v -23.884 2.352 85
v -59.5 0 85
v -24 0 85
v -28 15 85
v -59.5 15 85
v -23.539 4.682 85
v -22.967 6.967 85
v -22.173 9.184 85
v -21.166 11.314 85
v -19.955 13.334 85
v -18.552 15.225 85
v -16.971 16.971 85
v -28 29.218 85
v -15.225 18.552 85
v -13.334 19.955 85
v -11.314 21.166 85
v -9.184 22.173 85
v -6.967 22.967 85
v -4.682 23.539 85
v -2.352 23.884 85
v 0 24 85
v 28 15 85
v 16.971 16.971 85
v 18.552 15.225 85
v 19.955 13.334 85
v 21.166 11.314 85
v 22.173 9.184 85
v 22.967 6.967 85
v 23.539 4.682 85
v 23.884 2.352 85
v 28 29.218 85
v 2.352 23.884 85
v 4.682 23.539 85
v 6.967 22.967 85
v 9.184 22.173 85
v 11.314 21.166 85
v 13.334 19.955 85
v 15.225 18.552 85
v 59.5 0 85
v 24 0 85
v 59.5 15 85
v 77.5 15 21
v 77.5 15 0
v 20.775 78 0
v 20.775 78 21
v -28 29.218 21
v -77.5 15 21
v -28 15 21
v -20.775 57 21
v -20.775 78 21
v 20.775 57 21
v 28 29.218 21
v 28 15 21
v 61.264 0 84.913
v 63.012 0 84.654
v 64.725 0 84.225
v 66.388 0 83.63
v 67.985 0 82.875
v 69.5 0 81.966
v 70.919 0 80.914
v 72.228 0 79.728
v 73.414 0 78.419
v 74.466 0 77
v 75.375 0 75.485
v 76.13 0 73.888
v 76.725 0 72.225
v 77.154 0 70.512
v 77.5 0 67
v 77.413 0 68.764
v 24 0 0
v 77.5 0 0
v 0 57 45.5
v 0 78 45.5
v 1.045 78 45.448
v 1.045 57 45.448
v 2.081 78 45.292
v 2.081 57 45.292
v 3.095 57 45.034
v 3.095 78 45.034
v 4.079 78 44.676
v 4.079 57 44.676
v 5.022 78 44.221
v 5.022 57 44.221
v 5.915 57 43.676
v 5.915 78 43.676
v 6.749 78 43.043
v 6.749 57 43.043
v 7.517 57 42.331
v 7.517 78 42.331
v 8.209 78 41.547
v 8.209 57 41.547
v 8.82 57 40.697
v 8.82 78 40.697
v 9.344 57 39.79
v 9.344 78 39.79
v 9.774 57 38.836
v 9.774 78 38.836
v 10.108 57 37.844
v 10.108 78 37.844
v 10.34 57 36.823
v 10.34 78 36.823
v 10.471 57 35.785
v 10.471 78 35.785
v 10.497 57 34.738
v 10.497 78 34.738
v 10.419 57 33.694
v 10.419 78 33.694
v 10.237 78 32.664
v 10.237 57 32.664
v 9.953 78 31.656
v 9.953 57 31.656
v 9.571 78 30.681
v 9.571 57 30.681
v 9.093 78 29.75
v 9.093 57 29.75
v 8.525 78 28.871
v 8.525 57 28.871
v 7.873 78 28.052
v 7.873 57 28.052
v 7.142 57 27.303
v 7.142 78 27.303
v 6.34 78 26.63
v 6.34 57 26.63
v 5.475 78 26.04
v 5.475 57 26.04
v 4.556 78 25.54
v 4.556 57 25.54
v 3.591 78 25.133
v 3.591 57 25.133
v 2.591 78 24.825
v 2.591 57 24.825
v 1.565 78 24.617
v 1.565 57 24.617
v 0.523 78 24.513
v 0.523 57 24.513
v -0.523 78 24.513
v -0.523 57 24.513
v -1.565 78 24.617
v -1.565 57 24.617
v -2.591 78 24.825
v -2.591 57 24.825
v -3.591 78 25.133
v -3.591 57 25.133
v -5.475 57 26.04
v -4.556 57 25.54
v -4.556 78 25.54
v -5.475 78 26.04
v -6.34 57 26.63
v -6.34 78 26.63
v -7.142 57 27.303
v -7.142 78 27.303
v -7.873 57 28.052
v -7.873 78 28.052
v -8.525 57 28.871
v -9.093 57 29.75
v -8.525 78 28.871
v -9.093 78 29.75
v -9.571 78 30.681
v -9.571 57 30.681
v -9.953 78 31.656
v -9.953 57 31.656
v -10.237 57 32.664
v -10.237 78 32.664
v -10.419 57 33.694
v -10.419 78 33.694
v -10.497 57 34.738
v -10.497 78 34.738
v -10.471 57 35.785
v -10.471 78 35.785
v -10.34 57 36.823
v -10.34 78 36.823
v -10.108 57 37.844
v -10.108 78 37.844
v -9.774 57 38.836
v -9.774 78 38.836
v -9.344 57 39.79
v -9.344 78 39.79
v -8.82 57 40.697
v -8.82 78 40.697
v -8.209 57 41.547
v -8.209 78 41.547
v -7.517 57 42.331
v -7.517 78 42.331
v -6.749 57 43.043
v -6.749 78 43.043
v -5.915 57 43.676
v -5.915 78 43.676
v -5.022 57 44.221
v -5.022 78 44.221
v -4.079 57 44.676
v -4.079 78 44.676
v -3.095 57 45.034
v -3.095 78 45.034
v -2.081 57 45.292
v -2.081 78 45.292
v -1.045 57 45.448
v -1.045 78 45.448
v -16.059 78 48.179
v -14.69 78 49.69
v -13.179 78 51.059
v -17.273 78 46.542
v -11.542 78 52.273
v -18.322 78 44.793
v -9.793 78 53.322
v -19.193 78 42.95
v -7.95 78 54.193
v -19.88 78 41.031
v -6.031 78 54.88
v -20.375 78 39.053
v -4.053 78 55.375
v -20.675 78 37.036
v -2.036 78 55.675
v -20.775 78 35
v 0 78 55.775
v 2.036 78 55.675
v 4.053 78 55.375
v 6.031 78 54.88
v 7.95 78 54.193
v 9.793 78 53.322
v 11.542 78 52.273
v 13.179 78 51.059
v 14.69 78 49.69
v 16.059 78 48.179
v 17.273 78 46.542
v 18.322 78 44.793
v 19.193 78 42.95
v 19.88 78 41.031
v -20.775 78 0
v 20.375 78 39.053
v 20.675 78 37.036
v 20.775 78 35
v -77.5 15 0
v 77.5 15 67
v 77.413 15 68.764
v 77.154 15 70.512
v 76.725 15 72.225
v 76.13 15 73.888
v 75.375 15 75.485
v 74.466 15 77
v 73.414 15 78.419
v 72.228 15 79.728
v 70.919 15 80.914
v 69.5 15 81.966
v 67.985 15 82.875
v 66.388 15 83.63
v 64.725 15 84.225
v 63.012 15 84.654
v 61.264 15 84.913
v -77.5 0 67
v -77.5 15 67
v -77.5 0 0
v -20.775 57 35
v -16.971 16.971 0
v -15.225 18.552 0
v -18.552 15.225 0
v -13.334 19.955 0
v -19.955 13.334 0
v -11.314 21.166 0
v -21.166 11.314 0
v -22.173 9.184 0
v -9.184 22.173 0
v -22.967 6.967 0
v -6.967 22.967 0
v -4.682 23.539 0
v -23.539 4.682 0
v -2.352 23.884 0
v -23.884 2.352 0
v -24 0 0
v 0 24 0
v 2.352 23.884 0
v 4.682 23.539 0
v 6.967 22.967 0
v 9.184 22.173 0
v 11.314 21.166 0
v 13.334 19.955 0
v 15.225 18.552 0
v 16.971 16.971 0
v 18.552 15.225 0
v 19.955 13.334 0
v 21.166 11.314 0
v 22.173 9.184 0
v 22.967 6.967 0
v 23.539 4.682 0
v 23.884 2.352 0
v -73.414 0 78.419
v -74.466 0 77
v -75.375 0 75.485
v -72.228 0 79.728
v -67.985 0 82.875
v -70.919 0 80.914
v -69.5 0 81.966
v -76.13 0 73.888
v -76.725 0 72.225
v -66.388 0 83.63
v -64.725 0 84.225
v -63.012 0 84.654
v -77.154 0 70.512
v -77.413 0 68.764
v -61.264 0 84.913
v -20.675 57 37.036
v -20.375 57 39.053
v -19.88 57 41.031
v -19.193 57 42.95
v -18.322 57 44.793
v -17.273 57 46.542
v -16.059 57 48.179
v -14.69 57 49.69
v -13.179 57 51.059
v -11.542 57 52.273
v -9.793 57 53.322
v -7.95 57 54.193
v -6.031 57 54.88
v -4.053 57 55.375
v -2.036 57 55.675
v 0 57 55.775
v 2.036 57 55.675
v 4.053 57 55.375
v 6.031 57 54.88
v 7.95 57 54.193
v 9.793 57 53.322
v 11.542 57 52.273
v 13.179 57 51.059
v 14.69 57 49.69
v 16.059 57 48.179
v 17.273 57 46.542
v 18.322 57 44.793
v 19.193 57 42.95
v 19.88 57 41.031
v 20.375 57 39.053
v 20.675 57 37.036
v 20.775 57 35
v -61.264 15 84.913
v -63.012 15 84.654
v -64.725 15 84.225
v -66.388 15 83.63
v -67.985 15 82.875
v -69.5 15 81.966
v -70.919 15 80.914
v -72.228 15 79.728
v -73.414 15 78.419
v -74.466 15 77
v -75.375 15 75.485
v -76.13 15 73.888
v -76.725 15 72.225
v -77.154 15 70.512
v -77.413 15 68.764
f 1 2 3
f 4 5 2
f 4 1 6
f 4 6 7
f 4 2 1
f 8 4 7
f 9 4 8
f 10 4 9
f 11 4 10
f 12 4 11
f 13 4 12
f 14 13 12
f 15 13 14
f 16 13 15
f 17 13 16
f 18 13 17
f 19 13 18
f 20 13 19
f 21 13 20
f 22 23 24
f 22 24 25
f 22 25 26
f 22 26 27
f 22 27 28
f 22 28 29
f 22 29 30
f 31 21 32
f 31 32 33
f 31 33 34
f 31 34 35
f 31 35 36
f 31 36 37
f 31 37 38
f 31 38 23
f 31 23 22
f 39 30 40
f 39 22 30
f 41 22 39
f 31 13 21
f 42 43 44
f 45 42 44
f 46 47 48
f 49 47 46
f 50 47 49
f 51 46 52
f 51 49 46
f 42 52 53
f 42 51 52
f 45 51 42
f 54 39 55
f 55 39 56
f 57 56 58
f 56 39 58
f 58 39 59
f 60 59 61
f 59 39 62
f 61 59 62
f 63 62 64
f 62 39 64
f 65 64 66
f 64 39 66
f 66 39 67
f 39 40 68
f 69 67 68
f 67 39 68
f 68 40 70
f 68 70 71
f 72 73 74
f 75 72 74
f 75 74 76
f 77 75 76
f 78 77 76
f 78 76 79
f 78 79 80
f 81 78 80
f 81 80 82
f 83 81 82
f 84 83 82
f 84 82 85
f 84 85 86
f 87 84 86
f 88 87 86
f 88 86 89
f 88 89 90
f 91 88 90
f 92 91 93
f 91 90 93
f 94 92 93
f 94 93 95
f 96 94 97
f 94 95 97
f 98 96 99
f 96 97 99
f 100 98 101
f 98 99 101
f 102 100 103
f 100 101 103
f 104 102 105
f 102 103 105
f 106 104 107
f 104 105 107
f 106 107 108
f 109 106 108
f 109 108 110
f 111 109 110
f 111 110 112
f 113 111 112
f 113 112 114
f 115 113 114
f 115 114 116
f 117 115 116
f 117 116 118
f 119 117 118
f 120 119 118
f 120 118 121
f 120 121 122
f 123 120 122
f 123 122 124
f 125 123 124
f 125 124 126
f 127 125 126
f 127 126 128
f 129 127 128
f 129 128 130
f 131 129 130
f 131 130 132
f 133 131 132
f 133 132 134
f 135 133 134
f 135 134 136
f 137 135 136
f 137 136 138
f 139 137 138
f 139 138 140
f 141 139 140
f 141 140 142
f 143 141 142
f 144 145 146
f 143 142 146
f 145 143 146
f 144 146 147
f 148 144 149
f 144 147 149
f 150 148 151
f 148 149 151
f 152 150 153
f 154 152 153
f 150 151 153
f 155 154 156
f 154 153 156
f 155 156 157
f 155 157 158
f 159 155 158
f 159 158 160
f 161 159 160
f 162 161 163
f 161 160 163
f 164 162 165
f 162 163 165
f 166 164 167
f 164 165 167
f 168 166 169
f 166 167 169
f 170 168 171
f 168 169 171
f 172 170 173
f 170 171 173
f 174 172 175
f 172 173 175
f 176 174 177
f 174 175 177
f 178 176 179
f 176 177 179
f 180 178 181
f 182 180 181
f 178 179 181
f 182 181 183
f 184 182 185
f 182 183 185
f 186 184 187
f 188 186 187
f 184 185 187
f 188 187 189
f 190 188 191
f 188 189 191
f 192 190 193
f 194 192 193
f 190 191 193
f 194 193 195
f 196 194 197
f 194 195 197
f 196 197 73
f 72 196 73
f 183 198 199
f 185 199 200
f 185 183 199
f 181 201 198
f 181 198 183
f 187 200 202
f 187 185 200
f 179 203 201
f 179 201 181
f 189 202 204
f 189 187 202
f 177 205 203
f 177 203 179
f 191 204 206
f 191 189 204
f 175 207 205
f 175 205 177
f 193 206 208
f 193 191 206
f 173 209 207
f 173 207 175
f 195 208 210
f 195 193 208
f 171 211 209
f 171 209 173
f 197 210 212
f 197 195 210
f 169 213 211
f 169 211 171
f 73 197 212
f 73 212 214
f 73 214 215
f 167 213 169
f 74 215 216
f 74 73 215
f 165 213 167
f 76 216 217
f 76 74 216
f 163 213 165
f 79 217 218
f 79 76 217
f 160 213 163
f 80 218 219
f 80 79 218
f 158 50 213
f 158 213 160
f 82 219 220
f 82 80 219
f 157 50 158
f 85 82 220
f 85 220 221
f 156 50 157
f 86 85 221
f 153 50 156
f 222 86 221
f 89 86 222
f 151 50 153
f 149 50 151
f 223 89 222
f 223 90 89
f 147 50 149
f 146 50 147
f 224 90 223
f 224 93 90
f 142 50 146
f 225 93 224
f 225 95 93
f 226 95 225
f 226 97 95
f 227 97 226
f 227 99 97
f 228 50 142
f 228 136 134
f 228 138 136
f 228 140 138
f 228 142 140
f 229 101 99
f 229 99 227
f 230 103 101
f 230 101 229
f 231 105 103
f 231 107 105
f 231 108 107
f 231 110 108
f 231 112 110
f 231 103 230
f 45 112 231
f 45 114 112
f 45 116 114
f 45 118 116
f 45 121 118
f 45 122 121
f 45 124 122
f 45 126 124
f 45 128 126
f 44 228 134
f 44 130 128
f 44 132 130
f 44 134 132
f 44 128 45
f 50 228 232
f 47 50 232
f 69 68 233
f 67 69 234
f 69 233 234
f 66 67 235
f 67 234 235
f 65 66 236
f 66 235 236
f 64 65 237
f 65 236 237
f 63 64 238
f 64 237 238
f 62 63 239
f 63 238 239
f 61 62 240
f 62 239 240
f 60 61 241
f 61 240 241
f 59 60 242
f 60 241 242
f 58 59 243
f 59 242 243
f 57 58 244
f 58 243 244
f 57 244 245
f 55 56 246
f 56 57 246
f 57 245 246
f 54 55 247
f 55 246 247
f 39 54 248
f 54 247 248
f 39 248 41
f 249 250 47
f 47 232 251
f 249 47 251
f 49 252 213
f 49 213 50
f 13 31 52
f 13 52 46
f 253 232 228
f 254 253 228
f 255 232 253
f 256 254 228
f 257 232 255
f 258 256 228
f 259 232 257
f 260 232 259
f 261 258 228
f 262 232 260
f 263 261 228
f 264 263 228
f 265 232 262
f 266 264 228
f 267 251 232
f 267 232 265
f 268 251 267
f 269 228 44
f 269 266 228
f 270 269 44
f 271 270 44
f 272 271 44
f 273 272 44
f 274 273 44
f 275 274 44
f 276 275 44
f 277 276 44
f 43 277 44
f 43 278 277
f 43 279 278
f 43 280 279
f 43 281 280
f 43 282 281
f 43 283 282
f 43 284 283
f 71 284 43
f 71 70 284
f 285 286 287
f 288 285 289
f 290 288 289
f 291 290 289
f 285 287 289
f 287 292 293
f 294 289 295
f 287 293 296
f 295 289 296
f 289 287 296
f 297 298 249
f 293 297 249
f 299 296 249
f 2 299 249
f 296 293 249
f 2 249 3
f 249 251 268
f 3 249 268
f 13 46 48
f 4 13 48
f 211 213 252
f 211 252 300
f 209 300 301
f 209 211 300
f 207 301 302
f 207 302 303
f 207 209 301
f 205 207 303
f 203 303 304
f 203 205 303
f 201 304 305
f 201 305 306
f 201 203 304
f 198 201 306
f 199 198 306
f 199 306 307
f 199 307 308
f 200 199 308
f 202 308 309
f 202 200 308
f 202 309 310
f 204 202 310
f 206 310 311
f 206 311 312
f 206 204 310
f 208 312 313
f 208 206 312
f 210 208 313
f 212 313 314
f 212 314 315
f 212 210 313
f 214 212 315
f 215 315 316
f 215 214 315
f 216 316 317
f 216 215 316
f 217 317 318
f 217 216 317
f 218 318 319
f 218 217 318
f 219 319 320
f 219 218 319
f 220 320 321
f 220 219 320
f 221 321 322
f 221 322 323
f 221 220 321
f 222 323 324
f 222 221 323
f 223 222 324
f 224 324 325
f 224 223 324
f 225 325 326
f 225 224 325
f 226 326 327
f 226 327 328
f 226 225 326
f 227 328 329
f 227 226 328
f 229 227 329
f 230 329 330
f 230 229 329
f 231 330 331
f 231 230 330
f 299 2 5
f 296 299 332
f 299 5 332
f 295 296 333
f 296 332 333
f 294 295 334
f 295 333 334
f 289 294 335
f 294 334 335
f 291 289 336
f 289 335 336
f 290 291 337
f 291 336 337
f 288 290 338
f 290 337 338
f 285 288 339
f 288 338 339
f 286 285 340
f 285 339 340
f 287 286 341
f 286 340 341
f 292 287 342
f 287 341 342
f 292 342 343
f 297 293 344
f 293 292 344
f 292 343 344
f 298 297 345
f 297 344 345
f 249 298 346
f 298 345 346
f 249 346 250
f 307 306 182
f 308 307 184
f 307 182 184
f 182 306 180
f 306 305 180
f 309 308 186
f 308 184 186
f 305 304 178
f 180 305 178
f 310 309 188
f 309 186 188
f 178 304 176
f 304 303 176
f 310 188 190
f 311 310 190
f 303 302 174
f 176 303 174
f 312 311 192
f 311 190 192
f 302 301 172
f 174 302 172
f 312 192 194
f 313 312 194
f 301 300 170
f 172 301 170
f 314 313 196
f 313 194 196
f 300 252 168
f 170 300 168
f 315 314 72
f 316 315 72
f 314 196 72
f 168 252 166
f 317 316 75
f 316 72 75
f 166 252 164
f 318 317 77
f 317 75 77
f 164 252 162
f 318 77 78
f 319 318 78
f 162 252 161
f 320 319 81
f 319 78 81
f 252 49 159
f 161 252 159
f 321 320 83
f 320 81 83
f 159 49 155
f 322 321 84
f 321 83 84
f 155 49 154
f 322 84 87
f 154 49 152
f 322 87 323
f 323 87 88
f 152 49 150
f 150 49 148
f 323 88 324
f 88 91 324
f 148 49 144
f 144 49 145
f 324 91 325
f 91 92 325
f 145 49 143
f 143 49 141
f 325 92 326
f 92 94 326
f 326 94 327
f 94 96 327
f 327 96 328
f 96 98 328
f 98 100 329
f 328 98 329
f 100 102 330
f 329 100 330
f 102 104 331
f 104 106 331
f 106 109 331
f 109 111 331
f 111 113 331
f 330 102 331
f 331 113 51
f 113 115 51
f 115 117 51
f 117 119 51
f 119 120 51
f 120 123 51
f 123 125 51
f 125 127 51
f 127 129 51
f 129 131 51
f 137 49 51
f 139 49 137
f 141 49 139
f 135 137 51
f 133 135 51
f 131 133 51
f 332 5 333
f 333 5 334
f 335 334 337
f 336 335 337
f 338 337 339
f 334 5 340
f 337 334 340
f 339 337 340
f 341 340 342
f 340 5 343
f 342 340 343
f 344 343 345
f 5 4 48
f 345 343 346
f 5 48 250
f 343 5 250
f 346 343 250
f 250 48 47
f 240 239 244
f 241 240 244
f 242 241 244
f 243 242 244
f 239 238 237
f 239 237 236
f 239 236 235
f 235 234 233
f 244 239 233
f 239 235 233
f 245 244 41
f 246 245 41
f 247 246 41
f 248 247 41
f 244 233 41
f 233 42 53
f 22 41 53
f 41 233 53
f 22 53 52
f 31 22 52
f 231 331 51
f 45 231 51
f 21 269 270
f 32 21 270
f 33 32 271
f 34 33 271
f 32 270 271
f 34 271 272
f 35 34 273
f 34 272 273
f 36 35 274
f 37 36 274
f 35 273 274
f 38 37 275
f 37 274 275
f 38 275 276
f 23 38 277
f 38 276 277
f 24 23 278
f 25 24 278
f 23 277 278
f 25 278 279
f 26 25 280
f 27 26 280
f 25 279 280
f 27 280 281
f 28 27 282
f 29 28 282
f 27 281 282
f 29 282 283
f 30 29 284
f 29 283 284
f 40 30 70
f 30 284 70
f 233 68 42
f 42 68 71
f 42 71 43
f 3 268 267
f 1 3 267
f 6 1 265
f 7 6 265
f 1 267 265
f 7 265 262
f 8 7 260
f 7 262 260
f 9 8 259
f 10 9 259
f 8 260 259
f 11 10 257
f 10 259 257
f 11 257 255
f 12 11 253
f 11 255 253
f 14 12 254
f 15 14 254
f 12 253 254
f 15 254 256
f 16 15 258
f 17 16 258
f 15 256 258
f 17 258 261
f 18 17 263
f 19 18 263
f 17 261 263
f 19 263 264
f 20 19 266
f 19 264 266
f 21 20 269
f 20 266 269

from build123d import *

# Parameters (mm, degrees)
EXTRUDE_1_DEPTH     = 85
EXTRUDE_2_DEPTH     = 21
CUT_EXTRUDE_1_DEPTH = 21
CUT_EXTRUDE_2_DEPTH = 21
SKETCH_4_W          = 41.549090418
SKETCH_4_H          = 35
EXTRUDE_3_DEPTH     = 21
SKETCH_5_R          = 20.774545209
SKETCH_5_R_2        = 10.5
EXTRUDE_4_DEPTH     = 21
SKETCH_7_R          = 10.5
CUT_EXTRUDE_3_DEPTH = 21


with BuildPart() as part:
    # 스케치1 → 보스-돌출1 (new body)
    with BuildSketch(Plane.XY):
        with BuildLine():
            ThreePointArc((-24, 0), (0, 24), (24, 0))
            Line((24, 0), (77.5, 0))
            Line((77.5, 0), (77.5, 15))
            Line((77.5, 15), (28, 15))
            Line((28, 15), (28, 29.218478607))
            Line((28, 29.218478607), (-28, 29.218478607))
            Line((-28, 29.218478607), (-28, 15))
            Line((-28, 15), (-77.5, 15))
            Line((-77.5, 15), (-77.5, 0))
            Line((-77.5, 0), (-24, 0))
        make_face()
    extrude(amount=EXTRUDE_1_DEPTH)

    # 스케치1<3> → 보스-돌출2 (add)
    with BuildSketch(Plane.XY):
        Polygon((-28, 29.218478607), (28, 29.218478607), (28, 15), (77.5, 15), (20.774545209, 78), (20.774545209, 57), (-20.774545209, 57), (-20.774545209, 78), (-77.5, 15), (-28, 15), align=None)
    extrude(amount=EXTRUDE_2_DEPTH)

    # 스케치3 → 컷-돌출1 (cut)
    with BuildSketch(Plane(origin=(0, 15, 0), x_dir=(1, 0, 0), z_dir=(0, 1, 0))):
        with BuildLine():
            ThreePointArc((77.5, -67), (72.227922061, -79.727922061), (59.5, -85))
            Line((59.5, -85), (77.5, -85))
            Line((77.5, -85), (77.5, -67))
        make_face()
    extrude(amount=-CUT_EXTRUDE_1_DEPTH, mode=Mode.SUBTRACT)

    # 스케치2 → 컷-돌출2 (cut)
    with BuildSketch(Plane(origin=(0, 15, 0), x_dir=(1, 0, 0), z_dir=(0, 1, 0))):
        with BuildLine():
            ThreePointArc((-59.5, -85), (-72.227922061, -79.727922061), (-77.5, -67))
            Line((-77.5, -67), (-77.5, -85))
            Line((-77.5, -85), (-59.5, -85))
        make_face()
    extrude(amount=-CUT_EXTRUDE_2_DEPTH, mode=Mode.SUBTRACT)

    # 스케치4 → 보스-돌출3 (add)
    with BuildSketch(Plane(origin=(0, 57, 0), x_dir=(1, 0, 0), z_dir=(0, 1, 0))):
        with Locations((0, -17.5)):
            Rectangle(SKETCH_4_W, SKETCH_4_H)
    extrude(amount=EXTRUDE_3_DEPTH)

    # 스케치5 → 보스-돌출4 (add)
    with BuildSketch(Plane(origin=(0, 78, 0), x_dir=(1, 0, 0), z_dir=(0, 1, 0))):
        with Locations((0, -35)):
            Circle(SKETCH_5_R)
        with Locations((0, -35)):
            Circle(SKETCH_5_R_2, mode=Mode.SUBTRACT)
    extrude(amount=-EXTRUDE_4_DEPTH)

    # 스케치7 → 컷-돌출3 (cut)
    with BuildSketch(Plane(origin=(0, 78, 0), x_dir=(1, 0, 0), z_dir=(0, 1, 0))):
        with Locations((0, -35)):
            Circle(SKETCH_7_R)
    extrude(amount=-CUT_EXTRUDE_3_DEPTH, mode=Mode.SUBTRACT)


solid = part.part
